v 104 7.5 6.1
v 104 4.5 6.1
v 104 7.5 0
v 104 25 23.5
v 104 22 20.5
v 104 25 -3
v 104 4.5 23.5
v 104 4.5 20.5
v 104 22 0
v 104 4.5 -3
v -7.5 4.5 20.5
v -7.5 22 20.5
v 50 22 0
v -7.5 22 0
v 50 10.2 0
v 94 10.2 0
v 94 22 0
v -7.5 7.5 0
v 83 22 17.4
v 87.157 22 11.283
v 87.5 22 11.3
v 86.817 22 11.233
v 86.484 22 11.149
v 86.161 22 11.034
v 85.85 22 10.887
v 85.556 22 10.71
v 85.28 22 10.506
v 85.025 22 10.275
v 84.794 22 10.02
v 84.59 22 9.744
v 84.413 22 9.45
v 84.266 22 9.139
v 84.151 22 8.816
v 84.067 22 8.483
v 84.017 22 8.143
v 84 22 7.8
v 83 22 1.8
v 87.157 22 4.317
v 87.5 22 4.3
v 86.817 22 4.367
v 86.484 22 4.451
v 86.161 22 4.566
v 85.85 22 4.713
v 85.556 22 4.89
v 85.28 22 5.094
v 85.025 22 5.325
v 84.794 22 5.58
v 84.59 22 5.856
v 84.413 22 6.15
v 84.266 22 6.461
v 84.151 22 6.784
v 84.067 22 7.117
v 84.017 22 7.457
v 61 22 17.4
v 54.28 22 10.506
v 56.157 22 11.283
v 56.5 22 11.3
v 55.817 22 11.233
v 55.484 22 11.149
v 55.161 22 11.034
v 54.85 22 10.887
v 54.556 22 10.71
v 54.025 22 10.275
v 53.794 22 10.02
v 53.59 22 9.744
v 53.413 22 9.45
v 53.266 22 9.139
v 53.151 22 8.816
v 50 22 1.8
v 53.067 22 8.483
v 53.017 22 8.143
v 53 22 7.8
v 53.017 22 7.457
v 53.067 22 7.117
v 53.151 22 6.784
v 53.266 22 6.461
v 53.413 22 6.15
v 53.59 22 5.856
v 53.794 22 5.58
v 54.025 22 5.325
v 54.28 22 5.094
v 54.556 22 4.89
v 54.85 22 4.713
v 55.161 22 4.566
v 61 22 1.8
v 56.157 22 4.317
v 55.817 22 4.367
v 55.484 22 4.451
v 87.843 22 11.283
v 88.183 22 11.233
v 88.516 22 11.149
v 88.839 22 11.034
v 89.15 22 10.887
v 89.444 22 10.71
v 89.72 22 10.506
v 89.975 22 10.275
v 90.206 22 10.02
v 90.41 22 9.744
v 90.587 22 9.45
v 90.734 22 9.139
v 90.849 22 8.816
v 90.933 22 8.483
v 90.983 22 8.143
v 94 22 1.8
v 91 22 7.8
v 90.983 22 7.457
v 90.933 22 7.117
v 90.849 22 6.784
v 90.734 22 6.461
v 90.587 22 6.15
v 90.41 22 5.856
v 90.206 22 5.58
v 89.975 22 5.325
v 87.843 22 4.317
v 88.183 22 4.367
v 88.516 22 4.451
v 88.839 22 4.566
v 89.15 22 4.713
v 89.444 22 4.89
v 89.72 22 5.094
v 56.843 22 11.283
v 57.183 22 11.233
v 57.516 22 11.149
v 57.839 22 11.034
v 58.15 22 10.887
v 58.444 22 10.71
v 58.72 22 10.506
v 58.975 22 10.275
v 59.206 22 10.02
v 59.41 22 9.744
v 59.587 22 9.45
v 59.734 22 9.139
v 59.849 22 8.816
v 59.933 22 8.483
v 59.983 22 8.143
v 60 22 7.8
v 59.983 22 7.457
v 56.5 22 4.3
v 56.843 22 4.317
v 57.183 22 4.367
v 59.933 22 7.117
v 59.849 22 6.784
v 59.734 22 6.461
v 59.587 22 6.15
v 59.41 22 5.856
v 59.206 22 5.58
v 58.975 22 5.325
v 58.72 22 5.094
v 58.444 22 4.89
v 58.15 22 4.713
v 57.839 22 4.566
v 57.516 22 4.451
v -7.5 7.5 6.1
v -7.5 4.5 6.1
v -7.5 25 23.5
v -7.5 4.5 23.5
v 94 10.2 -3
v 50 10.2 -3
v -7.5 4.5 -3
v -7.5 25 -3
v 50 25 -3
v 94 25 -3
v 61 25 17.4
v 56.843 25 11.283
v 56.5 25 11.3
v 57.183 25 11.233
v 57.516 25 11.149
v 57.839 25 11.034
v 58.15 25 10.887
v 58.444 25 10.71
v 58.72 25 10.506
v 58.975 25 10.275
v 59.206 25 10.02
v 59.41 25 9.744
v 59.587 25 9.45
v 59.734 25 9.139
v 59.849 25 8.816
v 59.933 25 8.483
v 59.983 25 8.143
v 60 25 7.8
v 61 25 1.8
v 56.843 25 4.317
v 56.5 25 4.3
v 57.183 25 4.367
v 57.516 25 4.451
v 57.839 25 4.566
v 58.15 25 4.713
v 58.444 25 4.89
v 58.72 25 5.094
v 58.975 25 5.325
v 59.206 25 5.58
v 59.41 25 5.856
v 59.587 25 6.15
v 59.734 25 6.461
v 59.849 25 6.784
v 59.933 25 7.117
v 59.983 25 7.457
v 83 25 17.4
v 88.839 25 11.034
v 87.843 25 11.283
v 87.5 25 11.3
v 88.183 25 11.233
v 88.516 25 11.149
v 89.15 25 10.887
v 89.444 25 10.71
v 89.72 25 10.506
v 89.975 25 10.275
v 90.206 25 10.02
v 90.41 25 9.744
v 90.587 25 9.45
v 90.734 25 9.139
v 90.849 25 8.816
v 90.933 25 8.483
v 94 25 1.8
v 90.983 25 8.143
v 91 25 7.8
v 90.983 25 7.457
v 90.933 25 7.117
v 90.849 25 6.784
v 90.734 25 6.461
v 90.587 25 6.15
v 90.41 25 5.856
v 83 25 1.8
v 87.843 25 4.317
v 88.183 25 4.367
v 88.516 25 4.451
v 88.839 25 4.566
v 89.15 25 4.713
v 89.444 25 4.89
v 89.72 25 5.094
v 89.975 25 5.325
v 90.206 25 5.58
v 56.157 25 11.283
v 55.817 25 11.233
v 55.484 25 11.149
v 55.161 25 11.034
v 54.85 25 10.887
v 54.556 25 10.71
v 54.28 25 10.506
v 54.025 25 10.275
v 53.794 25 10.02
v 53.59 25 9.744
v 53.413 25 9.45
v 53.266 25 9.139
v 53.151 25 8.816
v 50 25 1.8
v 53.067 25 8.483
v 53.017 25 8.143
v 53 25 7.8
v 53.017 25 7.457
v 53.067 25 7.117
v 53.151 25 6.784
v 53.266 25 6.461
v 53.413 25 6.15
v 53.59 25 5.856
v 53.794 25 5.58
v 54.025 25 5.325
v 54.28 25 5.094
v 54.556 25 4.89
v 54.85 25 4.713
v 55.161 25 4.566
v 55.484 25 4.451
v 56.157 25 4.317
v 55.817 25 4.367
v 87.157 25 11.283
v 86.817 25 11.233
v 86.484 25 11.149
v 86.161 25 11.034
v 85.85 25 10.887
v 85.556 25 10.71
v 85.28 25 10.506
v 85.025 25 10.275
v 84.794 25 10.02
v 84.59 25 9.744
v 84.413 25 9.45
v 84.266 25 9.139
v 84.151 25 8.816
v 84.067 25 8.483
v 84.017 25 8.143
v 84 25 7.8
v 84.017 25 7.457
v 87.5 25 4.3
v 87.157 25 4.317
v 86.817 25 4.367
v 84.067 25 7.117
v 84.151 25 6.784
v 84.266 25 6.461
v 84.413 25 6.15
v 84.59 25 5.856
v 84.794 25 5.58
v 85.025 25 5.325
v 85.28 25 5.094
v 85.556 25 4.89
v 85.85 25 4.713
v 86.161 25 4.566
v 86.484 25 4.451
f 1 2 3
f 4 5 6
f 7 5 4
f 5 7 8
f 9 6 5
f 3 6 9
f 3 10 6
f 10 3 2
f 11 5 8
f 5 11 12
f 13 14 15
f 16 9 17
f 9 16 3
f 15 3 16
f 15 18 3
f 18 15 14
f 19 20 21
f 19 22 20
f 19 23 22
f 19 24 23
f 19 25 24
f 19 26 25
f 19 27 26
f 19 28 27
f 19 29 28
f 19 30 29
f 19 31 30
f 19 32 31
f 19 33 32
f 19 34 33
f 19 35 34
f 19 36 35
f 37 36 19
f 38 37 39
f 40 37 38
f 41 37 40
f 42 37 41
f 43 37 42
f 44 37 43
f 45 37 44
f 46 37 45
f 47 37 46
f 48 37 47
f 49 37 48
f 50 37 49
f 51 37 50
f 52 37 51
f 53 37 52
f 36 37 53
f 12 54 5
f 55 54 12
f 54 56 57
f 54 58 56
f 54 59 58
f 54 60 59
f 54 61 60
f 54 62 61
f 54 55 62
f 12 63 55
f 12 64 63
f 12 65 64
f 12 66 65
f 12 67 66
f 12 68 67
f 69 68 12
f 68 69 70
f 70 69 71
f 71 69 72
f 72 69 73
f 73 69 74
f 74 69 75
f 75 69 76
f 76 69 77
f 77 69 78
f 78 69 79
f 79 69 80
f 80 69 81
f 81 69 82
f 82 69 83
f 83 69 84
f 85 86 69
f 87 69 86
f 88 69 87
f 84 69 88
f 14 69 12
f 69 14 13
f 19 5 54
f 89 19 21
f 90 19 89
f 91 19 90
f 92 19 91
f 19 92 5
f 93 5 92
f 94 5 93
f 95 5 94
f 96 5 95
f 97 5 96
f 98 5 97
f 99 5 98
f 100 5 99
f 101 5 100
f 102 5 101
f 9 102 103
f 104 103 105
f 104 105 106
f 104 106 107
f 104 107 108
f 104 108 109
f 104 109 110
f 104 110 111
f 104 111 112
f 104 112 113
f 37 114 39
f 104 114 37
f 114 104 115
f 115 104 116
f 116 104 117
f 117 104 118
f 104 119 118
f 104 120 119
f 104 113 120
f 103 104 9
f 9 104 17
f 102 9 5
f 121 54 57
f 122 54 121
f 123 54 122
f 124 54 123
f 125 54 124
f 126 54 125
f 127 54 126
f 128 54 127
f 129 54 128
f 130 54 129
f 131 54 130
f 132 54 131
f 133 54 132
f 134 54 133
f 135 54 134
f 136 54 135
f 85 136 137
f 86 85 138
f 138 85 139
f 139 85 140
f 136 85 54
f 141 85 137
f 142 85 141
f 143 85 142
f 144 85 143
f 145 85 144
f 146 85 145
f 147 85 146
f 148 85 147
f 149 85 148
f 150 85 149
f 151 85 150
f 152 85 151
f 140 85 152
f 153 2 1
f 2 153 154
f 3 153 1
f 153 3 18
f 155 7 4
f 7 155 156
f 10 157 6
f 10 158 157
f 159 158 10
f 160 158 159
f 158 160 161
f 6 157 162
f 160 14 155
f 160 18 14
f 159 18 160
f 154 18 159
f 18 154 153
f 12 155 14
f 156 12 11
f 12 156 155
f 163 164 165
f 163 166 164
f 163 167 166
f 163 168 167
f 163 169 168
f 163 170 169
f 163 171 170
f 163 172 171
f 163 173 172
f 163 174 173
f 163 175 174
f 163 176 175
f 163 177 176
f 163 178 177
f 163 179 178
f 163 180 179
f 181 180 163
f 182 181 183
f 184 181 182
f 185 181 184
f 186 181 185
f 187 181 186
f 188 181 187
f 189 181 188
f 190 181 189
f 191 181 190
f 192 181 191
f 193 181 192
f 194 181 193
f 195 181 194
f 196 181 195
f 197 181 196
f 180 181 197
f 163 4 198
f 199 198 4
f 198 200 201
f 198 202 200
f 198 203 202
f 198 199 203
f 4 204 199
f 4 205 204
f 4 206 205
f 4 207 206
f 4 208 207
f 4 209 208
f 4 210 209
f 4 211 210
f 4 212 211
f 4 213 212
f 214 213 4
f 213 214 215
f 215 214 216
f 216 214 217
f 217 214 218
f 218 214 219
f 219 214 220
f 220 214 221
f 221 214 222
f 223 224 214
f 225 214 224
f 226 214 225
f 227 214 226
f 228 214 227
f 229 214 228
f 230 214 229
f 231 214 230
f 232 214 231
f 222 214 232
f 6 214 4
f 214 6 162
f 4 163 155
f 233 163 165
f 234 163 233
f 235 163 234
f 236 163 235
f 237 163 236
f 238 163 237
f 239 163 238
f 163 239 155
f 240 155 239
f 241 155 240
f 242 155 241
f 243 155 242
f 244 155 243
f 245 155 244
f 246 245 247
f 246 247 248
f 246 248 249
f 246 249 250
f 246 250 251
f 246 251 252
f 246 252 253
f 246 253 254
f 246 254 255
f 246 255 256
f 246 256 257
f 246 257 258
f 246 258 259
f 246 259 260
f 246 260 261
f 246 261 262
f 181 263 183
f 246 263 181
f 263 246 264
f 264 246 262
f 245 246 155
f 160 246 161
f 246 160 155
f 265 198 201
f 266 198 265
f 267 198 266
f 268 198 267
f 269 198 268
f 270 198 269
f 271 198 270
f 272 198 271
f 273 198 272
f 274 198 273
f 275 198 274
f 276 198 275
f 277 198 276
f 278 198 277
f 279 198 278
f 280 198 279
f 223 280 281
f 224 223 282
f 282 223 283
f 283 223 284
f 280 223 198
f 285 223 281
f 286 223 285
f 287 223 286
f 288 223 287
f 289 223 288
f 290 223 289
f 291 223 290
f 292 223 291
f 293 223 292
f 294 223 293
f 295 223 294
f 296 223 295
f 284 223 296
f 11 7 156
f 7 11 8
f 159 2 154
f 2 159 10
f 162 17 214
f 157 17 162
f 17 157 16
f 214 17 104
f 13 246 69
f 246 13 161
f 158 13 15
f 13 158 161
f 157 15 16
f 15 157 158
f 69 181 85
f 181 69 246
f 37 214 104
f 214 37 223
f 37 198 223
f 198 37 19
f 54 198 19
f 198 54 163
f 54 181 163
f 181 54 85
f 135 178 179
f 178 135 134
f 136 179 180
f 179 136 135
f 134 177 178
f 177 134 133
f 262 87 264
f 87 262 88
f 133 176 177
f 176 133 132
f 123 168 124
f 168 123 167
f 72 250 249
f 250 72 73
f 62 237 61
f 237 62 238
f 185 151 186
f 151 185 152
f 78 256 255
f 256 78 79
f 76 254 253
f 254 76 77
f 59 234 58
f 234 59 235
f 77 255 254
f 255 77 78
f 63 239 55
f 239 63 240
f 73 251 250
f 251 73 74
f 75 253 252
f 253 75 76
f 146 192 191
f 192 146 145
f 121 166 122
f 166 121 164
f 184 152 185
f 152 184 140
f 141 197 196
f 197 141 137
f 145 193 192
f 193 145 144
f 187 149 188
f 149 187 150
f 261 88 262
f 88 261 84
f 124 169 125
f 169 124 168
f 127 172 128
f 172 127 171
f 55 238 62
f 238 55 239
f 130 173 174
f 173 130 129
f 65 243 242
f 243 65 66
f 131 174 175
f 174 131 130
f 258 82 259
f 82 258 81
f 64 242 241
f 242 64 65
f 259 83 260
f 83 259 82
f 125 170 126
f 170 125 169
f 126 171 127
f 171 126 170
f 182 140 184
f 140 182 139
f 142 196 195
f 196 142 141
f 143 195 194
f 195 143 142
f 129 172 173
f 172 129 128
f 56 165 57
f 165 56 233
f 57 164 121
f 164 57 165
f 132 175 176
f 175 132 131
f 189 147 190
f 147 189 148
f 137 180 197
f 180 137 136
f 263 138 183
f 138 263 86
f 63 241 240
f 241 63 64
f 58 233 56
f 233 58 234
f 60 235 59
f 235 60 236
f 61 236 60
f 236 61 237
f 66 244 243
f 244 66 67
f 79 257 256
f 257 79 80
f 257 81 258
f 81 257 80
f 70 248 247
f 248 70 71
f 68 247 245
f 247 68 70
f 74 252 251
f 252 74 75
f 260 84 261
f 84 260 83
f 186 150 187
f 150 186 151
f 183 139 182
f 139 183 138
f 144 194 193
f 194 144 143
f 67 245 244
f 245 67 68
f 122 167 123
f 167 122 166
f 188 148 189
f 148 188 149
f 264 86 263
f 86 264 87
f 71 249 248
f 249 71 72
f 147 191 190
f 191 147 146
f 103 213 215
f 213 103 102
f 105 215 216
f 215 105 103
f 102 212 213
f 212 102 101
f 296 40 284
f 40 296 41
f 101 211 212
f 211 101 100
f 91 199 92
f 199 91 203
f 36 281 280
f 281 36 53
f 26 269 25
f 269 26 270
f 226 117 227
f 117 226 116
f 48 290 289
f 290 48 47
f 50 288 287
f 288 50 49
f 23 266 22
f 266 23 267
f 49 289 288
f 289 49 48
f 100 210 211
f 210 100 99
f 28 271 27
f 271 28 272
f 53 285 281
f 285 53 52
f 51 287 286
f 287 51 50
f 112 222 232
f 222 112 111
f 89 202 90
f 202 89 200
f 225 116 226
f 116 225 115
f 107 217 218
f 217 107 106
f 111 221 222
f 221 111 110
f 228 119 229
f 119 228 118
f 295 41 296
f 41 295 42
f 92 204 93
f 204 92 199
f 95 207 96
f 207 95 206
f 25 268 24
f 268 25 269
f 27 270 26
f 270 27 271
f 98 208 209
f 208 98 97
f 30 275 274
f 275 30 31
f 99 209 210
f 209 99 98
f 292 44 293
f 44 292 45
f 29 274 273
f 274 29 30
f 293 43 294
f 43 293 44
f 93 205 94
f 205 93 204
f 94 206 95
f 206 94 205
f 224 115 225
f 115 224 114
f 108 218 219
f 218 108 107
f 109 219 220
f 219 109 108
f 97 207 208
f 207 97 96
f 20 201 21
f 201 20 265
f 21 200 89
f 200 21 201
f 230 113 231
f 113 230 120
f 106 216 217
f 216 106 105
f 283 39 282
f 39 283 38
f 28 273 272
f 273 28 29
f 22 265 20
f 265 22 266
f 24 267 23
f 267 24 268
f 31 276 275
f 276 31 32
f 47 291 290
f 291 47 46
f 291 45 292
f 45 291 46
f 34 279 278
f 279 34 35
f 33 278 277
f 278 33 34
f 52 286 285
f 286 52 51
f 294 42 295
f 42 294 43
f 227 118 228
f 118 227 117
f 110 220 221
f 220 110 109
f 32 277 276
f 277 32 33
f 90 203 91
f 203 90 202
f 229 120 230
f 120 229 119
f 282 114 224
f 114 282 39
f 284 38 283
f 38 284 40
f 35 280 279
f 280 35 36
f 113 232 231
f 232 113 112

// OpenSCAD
$fn = $preview ? 16 : 64;

w = 20+0.5;
h1 = 14 + 0.5;
h2 = 22;

module profile(l = 100, fill = false) {
        T = 1.4;

        difference() {
                cube([l, h2, w]);
                translate([0, T, 0]) cube([l, h2-h1-T, h2-h1-T]);
                if (!fill) {
                        translate([0, h2-h1+T, T]) cube([l, h1-2*T, w-2*T]);
                        translate([0, T, h2-h1]) cube([l, h2-h1, w-h2+h1-T]);
                }
                prism(w, h2, w);
        }
}

module prism(l, w, h){
      polyhedron(//pt 0        1        2        3        4        5
              points=[[0,0,0], [l,0,0], [l,w,0], [0,w,0], [0,0,h], [0,w,h]],
              faces=[[0,1,2,3],[0,4,5,3],[1,2,5,4],[0,1,4],[5,2,3]]
              );
}

T = 3;

offset = 50; //143 for side clips

l = w + offset + 44 + 10;

delta = 0.4;

difference() {
        translate([-h2+h1, h2-h1-T, -T]) cube([l-w+h2-h1, h1 + 2 * T, w + 2 * T]);
        translate([-w, 0, 0]) profile(l = l, fill = true);
        translate([offset, h2-11.4-delta, -T]) cube([44, 11.4+delta, T]);
        translate([offset, h2-delta, -T]) cube([44, T+delta, 1.4 + T + delta]);
        translate([offset+11, h2, -T]) cube([22, T, 17 + T+delta]);
        translate([offset+6.5, h2+T, 1.4+6+delta]) rotate([90, 0, 0]) cylinder(h = T, d = 7);
        translate([offset+6.5+31, h2+T, 1.4+6+delta]) rotate([90, 0, 0]) cylinder(h = T, d = 7);
}

        // color("black", 0.7) translate([-w, 0, 0]) profile(l = l);
